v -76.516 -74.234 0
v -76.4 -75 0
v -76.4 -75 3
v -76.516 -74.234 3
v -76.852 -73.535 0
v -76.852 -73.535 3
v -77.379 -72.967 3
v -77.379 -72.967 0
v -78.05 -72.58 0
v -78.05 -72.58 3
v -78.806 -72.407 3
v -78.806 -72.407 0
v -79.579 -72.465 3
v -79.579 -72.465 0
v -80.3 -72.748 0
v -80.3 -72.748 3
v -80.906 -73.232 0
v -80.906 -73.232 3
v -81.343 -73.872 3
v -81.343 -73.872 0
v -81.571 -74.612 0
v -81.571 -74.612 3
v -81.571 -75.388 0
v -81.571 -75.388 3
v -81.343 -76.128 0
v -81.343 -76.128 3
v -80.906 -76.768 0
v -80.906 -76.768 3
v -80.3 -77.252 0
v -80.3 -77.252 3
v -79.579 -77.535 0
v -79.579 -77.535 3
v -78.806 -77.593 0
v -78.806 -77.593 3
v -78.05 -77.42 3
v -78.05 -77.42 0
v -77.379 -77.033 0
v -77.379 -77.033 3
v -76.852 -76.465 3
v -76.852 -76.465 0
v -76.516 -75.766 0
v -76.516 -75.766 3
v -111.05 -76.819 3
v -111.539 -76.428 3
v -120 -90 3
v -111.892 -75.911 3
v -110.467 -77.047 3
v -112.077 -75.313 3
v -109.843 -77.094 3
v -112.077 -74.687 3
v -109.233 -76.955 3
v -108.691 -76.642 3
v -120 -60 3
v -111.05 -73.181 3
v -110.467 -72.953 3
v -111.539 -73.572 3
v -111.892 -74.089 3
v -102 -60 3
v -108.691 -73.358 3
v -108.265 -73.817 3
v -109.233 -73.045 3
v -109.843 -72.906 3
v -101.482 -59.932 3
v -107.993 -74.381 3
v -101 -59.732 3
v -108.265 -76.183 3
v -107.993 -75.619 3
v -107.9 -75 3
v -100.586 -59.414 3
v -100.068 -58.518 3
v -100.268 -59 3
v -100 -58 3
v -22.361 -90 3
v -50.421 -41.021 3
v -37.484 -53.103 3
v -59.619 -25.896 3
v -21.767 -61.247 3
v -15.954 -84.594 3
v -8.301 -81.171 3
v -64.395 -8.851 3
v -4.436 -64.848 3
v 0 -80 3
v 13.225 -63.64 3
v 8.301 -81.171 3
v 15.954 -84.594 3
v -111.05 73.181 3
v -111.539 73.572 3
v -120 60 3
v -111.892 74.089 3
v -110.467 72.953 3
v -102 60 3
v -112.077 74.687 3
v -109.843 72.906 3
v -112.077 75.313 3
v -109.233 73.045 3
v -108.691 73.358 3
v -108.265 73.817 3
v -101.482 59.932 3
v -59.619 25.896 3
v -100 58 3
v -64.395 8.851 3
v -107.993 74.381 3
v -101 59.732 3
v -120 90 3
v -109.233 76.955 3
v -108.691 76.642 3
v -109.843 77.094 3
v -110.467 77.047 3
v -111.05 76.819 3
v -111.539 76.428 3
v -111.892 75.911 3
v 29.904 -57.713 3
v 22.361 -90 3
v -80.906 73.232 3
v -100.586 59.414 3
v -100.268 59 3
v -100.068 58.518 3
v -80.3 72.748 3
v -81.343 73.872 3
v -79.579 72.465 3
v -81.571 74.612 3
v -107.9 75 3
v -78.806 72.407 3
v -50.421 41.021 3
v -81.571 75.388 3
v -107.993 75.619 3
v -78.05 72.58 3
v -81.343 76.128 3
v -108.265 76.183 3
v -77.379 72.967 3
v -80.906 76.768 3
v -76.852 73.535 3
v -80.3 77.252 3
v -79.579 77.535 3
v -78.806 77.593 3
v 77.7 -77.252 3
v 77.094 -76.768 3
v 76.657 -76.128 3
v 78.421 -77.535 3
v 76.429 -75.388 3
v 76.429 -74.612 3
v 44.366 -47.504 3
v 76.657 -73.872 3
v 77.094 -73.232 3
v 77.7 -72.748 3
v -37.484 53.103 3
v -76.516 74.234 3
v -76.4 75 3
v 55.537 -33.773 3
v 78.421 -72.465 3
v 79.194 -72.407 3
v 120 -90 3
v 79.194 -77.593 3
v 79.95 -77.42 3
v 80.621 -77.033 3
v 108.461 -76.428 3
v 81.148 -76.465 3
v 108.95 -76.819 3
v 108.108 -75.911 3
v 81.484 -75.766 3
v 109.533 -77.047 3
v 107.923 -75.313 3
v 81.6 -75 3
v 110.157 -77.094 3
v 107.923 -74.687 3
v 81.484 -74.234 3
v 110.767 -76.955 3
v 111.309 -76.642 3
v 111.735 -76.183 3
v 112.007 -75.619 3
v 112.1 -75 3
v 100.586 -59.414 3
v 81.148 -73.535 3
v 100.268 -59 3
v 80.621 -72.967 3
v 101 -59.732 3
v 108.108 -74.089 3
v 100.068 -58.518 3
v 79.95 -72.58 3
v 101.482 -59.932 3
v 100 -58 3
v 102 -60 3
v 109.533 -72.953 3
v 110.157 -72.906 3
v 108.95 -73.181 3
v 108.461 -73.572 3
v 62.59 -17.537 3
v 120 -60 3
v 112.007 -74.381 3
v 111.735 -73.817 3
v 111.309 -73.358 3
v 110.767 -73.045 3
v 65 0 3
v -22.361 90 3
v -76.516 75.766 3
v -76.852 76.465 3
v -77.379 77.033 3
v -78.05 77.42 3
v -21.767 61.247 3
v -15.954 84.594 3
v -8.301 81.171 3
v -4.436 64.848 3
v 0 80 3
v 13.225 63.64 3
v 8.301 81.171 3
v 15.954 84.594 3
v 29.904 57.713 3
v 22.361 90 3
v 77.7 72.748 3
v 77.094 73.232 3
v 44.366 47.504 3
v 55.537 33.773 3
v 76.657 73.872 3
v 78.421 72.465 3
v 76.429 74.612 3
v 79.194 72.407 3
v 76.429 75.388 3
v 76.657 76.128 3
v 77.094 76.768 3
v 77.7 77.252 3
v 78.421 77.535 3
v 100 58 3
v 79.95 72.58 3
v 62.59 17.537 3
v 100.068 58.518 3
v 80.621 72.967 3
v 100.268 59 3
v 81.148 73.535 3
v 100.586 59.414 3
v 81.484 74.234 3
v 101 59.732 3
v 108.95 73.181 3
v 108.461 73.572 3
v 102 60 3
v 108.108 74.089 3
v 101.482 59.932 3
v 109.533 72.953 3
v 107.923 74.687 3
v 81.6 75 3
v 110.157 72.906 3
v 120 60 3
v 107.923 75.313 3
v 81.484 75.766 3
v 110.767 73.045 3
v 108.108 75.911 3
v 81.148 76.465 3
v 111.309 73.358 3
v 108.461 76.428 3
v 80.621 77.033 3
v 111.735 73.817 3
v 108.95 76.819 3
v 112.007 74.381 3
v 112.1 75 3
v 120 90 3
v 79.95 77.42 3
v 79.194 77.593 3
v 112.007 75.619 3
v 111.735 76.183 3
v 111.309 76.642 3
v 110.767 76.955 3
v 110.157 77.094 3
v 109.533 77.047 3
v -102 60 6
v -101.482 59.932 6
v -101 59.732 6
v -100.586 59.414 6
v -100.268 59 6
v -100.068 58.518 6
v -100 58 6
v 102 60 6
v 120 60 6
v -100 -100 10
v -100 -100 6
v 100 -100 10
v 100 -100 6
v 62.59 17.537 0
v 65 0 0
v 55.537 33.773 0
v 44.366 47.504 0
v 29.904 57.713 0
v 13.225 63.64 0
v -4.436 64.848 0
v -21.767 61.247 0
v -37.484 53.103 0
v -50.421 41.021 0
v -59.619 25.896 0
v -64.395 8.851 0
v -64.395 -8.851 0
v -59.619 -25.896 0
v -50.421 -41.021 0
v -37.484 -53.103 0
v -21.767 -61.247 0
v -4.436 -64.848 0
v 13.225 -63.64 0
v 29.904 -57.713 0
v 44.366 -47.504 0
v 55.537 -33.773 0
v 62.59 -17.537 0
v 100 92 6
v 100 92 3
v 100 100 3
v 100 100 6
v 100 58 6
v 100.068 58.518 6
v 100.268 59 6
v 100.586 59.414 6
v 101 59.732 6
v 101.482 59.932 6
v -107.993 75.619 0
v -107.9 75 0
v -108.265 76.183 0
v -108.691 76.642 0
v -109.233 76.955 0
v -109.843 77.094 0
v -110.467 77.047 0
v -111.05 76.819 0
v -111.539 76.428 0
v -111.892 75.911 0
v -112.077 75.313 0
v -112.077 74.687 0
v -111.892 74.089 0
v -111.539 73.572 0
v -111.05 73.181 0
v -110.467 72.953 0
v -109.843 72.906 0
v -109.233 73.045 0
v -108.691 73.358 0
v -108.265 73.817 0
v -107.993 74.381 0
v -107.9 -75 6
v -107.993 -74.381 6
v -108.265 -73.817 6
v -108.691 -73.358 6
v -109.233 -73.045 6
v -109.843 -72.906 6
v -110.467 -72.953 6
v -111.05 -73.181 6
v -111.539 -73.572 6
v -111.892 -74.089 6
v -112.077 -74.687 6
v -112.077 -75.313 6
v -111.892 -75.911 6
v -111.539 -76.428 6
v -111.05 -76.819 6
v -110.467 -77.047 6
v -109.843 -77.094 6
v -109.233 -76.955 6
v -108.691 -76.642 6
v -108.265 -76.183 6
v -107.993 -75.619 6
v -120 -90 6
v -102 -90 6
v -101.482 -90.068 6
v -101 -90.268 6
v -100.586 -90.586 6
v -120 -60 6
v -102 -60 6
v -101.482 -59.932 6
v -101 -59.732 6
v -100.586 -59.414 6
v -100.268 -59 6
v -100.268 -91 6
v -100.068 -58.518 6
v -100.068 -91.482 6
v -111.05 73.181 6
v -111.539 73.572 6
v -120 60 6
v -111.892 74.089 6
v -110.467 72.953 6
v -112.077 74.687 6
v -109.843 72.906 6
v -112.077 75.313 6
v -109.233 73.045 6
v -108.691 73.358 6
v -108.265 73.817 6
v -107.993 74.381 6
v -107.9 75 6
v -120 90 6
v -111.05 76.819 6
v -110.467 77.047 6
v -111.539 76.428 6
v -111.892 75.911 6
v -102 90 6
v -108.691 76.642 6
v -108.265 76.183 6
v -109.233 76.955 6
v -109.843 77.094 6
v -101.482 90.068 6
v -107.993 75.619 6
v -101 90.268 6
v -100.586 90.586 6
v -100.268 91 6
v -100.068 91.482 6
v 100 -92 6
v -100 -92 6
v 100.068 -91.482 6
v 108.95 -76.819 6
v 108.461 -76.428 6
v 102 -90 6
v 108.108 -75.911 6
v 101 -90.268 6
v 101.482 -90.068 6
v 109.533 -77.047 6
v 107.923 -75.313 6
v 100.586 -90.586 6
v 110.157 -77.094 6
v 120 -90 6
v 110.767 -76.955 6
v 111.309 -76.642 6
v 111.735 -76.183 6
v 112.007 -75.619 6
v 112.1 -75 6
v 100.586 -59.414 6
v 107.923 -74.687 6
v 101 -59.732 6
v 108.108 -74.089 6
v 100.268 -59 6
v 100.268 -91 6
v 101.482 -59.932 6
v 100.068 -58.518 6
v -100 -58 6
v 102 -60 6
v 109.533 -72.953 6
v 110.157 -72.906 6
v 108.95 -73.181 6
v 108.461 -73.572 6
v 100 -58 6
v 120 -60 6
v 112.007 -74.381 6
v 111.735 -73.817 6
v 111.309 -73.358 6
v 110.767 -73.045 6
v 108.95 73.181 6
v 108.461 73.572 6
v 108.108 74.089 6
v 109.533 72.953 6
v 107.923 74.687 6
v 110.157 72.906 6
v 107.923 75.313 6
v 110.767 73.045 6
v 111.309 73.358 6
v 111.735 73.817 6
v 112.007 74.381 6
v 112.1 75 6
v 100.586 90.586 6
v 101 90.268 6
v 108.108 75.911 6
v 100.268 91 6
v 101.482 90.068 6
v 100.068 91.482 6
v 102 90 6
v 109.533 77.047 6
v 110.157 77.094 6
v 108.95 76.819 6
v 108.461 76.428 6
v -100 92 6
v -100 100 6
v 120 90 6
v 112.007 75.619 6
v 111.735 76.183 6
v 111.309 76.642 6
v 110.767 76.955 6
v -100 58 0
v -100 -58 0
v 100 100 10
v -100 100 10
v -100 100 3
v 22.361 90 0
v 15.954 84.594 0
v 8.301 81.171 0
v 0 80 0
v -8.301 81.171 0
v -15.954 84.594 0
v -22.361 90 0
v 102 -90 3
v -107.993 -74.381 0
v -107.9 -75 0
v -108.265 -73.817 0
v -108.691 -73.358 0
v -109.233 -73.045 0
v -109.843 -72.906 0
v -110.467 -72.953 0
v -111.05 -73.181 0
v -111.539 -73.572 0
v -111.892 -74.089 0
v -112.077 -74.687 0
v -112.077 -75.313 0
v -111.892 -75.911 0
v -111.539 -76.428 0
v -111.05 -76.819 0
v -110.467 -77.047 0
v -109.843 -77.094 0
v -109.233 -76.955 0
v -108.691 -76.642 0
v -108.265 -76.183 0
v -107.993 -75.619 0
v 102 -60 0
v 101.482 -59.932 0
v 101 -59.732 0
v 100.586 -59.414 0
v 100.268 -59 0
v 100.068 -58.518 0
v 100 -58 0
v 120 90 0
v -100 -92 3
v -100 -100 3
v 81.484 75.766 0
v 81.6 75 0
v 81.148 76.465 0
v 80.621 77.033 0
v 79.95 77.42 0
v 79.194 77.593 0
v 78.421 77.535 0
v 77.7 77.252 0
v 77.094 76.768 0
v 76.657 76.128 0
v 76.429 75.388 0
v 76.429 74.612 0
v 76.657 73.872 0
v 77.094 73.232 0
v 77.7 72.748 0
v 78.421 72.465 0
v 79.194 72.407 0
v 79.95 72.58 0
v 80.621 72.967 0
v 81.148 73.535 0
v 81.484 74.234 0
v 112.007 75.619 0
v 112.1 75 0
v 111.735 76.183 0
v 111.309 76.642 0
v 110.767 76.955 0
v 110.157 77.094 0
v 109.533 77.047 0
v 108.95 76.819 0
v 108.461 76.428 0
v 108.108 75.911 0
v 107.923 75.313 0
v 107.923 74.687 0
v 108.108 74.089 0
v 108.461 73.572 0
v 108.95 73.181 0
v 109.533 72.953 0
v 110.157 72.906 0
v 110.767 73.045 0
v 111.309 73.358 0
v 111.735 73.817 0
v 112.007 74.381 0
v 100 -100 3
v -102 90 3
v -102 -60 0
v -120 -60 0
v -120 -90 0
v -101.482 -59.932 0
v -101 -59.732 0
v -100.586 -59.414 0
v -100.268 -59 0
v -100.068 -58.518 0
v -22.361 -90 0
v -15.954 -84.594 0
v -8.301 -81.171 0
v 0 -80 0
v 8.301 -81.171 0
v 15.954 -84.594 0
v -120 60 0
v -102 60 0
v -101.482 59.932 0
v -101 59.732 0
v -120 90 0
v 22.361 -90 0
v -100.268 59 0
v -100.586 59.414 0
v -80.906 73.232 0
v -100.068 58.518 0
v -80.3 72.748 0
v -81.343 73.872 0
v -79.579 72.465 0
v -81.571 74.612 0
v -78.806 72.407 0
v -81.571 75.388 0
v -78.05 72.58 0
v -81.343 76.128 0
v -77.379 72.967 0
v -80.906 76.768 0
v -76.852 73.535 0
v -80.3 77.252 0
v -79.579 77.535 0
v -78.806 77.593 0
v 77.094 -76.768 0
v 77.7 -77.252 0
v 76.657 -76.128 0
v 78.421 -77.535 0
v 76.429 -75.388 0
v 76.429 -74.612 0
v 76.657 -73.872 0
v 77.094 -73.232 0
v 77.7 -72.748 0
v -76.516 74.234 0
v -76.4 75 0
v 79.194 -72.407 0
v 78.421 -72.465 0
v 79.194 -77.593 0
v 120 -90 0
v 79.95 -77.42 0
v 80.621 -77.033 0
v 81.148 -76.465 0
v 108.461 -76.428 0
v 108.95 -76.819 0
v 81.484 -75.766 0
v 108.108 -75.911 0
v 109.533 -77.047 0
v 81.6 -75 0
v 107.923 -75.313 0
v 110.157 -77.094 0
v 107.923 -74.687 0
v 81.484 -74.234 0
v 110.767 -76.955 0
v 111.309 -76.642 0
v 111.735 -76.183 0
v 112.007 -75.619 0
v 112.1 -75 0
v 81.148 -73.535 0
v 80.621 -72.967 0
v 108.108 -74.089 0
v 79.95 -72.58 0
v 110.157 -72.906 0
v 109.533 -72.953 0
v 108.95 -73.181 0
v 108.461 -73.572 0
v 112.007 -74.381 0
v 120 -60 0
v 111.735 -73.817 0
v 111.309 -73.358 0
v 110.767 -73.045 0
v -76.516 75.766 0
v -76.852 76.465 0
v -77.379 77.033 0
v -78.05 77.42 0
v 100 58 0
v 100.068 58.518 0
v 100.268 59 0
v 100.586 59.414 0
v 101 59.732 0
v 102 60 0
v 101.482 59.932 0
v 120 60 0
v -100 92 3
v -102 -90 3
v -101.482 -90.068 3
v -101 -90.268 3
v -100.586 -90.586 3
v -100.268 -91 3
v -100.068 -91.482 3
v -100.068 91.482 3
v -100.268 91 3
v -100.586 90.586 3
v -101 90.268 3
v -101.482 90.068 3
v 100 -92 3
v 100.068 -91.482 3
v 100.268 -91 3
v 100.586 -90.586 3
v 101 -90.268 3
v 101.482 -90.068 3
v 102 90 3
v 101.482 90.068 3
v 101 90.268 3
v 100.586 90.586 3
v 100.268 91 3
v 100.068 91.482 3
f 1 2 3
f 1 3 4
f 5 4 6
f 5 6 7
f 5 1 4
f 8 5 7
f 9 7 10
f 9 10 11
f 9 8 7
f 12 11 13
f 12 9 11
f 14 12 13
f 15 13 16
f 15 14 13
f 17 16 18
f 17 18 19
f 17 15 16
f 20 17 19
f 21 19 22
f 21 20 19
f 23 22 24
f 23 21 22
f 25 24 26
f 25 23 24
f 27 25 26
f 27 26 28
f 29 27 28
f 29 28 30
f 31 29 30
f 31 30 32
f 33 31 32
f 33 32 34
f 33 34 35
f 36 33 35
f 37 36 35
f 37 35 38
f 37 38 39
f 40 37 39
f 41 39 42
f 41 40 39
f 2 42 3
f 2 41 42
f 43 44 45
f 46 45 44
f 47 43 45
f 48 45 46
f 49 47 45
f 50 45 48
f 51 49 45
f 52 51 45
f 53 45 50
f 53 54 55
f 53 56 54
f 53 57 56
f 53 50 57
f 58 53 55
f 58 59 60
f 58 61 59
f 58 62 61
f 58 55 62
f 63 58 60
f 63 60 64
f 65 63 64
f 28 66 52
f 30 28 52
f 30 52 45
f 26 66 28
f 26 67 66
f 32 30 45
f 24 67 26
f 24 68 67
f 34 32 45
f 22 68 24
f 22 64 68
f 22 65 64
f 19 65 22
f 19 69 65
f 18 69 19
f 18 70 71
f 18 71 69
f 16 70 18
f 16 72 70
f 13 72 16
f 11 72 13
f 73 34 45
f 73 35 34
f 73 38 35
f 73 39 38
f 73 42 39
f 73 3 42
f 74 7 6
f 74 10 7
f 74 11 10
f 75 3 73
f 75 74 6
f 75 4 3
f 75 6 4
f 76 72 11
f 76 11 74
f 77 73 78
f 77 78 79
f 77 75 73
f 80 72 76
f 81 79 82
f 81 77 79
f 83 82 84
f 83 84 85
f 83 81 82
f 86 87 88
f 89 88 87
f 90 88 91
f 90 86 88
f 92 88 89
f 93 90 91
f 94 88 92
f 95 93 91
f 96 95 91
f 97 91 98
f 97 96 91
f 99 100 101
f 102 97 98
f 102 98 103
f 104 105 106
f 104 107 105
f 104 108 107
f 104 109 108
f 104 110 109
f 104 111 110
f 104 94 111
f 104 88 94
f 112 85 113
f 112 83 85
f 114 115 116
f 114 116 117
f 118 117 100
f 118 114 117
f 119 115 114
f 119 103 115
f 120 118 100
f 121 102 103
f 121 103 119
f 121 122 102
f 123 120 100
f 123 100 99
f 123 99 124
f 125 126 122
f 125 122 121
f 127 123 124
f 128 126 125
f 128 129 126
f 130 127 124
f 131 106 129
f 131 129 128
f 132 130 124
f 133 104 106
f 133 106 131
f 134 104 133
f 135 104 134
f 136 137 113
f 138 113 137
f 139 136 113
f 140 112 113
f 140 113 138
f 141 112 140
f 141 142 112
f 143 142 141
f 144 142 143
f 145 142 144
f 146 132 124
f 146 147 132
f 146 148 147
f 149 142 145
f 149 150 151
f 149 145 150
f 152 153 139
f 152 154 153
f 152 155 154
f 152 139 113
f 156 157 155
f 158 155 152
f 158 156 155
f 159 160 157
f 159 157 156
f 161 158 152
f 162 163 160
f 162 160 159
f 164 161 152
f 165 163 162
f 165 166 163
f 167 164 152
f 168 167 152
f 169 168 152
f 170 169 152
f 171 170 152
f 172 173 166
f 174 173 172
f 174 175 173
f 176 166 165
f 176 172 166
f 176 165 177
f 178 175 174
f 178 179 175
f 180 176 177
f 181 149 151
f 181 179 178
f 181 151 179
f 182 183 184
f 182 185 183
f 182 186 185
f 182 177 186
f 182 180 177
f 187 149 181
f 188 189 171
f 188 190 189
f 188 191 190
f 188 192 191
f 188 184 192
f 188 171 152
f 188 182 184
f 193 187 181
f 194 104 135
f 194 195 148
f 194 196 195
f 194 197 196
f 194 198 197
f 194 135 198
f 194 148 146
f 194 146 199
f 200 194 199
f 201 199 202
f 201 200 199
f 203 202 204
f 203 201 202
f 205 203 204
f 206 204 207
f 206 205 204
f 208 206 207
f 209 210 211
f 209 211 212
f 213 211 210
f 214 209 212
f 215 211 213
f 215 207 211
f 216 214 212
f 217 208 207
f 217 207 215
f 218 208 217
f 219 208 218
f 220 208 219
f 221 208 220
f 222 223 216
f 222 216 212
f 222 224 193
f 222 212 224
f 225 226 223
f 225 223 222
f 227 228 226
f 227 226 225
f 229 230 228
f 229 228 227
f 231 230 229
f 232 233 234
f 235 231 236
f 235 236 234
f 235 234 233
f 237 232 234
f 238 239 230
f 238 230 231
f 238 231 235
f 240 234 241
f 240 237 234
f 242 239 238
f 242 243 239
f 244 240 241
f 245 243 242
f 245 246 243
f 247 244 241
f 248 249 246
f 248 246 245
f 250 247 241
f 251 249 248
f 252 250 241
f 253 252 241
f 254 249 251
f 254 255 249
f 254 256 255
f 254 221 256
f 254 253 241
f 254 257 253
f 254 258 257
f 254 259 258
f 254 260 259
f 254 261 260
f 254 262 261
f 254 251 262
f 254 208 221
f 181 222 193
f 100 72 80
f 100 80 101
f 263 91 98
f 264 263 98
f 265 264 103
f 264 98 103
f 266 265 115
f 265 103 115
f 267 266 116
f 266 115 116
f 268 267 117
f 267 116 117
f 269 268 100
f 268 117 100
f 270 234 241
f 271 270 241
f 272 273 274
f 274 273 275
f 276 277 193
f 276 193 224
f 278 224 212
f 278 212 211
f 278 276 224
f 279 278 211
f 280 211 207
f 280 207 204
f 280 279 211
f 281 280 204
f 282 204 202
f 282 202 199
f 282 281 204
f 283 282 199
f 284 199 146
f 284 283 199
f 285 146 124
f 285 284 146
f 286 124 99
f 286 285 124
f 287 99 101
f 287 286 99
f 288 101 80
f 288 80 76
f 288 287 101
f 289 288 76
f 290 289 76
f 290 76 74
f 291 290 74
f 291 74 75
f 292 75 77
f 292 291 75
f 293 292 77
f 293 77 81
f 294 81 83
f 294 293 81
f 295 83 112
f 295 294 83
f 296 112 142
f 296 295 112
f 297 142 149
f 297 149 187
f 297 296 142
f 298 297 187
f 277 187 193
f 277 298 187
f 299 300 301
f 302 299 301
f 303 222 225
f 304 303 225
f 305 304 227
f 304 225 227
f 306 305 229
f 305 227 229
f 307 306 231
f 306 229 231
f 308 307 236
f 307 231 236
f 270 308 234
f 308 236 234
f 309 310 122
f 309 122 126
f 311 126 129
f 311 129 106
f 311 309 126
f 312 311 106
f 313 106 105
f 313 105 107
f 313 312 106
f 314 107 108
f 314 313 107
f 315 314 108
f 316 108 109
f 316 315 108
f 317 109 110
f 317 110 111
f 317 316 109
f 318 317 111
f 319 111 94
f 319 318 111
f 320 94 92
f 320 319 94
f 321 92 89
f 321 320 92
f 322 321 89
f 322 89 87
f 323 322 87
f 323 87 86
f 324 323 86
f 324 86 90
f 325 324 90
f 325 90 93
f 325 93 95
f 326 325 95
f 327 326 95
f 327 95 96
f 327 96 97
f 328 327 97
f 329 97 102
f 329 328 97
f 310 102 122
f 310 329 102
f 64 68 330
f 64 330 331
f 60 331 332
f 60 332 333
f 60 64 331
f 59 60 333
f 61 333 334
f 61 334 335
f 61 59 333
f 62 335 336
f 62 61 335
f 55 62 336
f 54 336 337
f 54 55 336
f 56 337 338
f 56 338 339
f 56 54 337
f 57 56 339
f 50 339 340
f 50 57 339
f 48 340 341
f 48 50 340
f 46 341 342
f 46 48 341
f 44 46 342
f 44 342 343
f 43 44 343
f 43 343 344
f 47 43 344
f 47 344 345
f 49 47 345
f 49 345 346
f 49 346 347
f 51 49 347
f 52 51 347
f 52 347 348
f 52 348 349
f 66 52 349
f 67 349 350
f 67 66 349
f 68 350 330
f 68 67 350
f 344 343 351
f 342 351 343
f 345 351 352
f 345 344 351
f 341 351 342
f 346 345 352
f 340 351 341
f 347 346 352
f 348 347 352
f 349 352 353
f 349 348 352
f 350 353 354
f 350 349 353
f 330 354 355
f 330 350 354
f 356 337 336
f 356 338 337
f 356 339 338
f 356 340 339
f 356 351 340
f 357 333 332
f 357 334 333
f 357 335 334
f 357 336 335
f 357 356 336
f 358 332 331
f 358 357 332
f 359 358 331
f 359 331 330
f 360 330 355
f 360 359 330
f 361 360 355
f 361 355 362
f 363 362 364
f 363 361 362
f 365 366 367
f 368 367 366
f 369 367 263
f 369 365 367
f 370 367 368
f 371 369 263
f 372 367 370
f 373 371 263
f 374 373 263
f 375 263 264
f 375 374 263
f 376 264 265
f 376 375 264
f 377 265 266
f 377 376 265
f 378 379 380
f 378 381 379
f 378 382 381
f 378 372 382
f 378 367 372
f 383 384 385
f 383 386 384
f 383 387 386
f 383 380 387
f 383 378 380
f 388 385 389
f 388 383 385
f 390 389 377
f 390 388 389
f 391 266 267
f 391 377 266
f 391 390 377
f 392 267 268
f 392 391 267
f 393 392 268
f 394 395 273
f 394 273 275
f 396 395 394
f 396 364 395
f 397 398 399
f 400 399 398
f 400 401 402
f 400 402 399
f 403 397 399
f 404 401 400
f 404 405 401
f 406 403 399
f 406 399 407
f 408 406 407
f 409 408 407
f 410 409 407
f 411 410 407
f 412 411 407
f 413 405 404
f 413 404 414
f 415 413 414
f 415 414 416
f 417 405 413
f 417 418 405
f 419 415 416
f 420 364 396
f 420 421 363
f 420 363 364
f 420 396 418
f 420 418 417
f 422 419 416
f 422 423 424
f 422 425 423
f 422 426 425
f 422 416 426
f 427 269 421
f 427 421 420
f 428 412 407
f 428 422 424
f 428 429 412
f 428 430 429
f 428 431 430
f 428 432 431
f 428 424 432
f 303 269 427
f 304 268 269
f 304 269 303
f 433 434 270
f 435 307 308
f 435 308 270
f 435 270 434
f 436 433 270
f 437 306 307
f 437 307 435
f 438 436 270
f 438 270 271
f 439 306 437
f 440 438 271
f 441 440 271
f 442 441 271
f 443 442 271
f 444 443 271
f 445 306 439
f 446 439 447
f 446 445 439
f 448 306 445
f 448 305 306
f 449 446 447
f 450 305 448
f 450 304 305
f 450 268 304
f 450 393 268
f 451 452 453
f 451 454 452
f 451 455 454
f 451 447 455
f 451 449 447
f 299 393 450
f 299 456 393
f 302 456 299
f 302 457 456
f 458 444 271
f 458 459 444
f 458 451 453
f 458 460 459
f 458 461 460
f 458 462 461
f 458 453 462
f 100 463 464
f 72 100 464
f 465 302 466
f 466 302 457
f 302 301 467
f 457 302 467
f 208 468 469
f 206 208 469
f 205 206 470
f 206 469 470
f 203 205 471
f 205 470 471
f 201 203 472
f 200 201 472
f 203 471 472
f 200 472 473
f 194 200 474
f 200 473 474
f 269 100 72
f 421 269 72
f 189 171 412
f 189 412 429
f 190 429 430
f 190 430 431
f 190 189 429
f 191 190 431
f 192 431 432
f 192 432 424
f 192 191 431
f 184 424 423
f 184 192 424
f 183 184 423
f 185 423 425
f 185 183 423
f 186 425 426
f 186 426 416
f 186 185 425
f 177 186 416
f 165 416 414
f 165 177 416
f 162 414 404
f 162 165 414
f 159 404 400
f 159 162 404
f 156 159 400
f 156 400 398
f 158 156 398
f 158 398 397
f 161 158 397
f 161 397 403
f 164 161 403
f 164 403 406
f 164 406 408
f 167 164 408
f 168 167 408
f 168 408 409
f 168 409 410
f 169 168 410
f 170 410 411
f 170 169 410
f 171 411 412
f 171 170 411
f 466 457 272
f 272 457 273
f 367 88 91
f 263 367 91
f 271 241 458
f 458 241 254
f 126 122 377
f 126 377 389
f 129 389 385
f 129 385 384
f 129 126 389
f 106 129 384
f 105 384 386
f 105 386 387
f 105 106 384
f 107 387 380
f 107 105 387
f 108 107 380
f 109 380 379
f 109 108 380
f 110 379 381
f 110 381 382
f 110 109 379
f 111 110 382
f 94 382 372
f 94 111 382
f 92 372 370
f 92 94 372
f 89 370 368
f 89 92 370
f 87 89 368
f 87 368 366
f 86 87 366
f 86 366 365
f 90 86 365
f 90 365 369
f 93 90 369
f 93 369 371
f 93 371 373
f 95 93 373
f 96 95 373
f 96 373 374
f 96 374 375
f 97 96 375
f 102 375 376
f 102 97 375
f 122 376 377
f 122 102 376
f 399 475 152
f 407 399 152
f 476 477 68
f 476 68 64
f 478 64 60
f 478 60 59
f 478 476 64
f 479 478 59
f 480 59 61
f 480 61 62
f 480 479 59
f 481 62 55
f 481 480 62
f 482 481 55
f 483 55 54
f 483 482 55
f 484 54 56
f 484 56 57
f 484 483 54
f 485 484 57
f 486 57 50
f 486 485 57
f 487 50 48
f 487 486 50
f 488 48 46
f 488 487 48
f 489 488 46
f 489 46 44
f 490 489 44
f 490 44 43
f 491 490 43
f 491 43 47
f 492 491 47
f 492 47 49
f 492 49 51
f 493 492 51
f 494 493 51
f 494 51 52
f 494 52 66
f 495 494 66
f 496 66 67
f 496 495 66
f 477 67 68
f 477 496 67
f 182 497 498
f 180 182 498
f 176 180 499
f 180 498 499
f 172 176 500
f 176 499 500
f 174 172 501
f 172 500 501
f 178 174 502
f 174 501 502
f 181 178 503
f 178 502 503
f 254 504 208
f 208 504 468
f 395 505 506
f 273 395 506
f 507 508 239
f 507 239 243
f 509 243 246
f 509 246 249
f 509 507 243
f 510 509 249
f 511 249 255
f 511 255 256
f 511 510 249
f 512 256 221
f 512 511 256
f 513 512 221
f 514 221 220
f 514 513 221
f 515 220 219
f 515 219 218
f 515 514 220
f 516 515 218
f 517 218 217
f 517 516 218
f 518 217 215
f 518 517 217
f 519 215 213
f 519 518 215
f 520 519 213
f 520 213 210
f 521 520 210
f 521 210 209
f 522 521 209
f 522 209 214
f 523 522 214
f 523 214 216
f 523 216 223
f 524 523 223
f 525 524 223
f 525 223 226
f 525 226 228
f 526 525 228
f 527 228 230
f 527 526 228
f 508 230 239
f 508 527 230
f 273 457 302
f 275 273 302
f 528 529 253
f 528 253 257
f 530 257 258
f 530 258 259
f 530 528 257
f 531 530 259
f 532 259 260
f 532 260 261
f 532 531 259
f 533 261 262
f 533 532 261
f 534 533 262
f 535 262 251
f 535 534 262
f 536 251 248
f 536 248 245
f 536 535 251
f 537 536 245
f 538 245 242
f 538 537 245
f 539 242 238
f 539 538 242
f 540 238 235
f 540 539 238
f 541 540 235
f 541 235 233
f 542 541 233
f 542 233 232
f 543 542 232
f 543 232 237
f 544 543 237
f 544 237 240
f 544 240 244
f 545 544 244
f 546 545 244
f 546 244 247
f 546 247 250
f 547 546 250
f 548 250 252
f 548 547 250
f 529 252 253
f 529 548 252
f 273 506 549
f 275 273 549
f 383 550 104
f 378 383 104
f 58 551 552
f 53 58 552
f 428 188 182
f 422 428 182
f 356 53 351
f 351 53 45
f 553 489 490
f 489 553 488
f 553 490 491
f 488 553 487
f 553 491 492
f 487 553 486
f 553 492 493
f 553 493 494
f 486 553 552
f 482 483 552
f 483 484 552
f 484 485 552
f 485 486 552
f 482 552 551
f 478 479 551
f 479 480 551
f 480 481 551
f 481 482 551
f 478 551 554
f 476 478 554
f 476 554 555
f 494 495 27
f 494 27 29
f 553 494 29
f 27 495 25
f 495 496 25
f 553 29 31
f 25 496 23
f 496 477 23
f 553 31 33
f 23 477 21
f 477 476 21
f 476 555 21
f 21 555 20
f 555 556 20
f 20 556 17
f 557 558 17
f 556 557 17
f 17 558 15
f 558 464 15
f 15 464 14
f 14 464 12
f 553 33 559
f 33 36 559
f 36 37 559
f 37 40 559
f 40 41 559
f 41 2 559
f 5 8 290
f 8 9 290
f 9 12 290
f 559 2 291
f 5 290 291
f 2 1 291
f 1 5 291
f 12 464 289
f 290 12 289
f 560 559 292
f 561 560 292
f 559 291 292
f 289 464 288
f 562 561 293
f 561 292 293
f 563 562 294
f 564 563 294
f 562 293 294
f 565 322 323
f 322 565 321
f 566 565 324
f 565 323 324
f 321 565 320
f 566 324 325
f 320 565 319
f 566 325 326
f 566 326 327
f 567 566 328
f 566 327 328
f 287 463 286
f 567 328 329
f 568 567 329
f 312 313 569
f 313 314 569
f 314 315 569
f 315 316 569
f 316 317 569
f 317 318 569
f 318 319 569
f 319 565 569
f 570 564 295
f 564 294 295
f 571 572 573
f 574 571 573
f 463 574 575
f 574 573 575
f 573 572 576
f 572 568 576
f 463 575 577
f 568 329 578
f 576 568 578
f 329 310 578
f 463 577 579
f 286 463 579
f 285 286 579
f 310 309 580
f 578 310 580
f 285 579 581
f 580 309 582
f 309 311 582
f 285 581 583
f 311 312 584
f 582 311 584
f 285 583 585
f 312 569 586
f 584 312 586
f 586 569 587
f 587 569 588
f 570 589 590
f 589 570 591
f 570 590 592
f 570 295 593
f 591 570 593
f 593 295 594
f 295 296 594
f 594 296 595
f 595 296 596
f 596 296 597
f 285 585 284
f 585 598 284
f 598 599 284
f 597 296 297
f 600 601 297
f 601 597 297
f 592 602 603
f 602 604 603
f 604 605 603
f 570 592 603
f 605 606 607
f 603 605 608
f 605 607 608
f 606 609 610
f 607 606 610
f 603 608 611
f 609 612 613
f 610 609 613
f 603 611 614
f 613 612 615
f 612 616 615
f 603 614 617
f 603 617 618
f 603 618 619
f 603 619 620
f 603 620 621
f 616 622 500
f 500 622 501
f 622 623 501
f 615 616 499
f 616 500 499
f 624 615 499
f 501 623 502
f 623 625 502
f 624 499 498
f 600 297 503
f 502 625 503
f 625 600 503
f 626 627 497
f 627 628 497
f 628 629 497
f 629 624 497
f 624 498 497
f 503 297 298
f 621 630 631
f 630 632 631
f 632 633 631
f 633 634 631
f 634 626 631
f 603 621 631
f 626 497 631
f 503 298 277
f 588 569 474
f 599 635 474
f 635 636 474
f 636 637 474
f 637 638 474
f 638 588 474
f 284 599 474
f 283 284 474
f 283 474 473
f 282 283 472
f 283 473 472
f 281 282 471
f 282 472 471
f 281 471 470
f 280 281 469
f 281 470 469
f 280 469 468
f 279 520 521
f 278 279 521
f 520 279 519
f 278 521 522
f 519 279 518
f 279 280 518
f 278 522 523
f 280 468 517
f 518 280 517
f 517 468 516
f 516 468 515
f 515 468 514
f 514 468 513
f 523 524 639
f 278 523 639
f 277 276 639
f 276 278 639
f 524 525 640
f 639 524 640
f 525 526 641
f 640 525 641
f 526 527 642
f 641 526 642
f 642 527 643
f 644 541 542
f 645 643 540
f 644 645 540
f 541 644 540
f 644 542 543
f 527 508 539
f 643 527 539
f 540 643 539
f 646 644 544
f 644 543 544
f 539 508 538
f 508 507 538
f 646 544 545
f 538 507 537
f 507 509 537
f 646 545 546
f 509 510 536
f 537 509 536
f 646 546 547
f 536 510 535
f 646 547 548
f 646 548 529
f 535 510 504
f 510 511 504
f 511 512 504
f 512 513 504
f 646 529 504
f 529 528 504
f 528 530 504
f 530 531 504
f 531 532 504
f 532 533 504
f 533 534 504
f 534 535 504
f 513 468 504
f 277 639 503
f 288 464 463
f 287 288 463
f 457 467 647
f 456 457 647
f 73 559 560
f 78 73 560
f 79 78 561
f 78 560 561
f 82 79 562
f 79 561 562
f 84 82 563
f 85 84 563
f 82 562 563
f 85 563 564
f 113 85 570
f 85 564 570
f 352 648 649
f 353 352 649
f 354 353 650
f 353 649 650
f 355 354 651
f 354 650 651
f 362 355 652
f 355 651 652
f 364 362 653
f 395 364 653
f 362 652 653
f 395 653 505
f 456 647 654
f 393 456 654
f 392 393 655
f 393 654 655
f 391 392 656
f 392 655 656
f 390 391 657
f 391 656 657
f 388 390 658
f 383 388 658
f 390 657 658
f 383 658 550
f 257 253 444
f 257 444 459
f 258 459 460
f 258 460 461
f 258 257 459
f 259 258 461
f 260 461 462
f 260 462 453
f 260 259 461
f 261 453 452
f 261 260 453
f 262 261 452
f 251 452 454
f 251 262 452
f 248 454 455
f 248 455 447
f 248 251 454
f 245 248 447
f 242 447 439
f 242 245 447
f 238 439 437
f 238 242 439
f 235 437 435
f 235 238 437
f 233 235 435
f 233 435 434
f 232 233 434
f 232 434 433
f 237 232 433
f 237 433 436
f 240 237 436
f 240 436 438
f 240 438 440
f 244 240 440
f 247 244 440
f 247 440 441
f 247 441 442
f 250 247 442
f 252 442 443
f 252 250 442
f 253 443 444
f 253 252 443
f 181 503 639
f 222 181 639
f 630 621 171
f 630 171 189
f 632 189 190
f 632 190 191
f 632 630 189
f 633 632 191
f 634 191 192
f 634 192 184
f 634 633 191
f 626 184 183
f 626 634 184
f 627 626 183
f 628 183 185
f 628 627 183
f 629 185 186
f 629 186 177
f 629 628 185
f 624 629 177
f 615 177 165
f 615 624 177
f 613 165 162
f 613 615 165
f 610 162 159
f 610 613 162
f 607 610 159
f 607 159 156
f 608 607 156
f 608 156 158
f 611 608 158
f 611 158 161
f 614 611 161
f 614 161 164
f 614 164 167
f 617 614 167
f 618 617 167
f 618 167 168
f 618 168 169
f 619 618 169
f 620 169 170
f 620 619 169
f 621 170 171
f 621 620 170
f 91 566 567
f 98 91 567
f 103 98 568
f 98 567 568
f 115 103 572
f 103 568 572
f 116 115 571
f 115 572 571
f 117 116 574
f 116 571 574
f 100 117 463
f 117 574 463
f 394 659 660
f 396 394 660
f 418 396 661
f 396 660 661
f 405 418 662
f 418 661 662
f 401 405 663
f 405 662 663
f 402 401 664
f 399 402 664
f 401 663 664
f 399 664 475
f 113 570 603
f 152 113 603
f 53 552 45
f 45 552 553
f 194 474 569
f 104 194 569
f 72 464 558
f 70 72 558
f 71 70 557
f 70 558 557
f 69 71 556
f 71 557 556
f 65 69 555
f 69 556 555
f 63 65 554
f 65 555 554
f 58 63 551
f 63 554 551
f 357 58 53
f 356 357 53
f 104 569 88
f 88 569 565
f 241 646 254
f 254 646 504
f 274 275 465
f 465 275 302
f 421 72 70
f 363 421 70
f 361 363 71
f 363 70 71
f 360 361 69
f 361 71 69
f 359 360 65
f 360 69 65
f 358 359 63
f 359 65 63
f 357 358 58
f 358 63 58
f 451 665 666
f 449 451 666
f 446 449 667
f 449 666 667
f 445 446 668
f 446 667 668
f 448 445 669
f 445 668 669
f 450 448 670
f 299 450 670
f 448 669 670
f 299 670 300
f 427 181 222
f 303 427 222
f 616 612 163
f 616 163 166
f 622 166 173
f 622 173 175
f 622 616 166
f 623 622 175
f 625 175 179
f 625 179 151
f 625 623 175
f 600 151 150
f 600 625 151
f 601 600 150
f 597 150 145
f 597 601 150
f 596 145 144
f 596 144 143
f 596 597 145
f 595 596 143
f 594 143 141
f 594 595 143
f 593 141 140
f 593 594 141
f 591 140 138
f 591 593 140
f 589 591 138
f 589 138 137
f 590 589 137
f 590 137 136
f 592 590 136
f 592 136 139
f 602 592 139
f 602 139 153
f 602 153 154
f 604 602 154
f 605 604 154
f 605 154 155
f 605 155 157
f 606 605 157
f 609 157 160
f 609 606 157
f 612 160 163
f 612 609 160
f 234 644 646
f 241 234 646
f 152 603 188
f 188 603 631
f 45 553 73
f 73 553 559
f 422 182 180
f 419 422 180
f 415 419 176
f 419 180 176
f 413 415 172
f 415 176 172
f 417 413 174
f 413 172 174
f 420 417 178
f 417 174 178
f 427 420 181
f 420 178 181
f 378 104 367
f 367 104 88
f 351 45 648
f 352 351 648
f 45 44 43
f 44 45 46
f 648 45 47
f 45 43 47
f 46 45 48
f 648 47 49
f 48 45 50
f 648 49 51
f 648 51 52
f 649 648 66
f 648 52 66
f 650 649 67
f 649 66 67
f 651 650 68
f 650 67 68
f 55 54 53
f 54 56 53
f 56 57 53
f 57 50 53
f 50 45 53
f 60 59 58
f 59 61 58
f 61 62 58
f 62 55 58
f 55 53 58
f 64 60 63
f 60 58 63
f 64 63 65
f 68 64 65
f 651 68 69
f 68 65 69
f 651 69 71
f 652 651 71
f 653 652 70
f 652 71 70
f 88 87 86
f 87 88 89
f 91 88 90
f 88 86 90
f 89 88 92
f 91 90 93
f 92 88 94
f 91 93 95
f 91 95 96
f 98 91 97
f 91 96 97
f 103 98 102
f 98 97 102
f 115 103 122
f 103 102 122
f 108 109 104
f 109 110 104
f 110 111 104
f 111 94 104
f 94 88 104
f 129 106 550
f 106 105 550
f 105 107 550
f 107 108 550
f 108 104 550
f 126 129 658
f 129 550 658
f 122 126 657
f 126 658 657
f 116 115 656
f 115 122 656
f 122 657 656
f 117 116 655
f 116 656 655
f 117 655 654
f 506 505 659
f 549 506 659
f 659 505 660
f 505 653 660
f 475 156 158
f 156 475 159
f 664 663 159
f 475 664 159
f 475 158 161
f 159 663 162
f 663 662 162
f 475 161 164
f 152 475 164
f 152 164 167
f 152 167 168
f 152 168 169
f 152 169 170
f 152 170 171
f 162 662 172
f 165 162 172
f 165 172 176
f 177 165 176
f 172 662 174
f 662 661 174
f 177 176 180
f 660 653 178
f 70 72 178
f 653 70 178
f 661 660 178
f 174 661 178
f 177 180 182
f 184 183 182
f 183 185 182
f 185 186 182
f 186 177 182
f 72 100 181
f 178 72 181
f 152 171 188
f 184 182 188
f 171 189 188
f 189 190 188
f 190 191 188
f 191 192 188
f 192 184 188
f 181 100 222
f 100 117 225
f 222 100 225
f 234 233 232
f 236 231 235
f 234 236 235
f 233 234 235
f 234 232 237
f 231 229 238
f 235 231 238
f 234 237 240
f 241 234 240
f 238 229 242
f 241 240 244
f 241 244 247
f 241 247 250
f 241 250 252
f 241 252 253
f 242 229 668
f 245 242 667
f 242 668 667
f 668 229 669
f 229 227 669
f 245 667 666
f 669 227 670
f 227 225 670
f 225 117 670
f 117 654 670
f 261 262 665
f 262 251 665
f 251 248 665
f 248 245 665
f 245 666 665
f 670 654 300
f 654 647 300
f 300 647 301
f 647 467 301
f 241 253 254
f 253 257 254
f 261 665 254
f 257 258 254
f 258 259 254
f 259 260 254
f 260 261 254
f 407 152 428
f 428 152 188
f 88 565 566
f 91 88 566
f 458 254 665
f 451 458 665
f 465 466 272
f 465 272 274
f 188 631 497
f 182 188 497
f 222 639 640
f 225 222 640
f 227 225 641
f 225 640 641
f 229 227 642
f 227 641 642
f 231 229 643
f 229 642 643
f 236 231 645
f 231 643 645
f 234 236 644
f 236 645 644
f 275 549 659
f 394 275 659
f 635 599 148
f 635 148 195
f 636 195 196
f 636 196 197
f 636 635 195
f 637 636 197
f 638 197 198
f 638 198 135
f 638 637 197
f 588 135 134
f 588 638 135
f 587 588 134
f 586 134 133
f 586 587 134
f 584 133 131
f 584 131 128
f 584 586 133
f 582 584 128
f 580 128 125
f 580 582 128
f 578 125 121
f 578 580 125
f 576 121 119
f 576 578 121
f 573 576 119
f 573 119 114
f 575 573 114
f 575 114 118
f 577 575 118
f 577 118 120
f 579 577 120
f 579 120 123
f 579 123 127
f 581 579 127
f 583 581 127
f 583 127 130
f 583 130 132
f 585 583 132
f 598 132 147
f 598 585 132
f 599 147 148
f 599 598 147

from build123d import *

# Parameters (mm, degrees)
F0_R     = 2.1
F0_R_2   = 2.6
F0_R_3   = 65
F1_DEPTH = 3
F2_R     = 2.1
F2_R_2   = 2.6
F2_R_3   = 65
F3_DEPTH = 3
F5_DEPTH = 4


with BuildPart() as f1:
    # F0 (on Top) → F1 (new body)
    with BuildSketch(Plane.XY):
        with BuildLine():
            Line((-120, -60), (-120, -90))
            Line((-120, -90), (-102, -90))
            Line((-102, -90), (-22.360679775, -90))
            ThreePointArc((-22.360679775, -90), (0, -80), (22.360679775, -90))
            Line((22.360679775, -90), (102, -90))
            Line((102, -90), (120, -90))
            Line((120, -90), (120, -60))
            Line((120, -60), (102, -60))
            ThreePointArc((102, -60), (100.5857864376, -59.4142135624), (100, -58))
            Line((100, -58), (100, 58))
            ThreePointArc((100, 58), (100.5857864376, 59.4142135624), (102, 60))
            Line((102, 60), (120, 60))
            Line((120, 60), (120, 90))
            Line((120, 90), (102, 90))
            Line((102, 90), (22.360679775, 90))
            ThreePointArc((22.360679775, 90), (0, 80), (-22.360679775, 90))
            Line((-22.360679775, 90), (-102, 90))
            Line((-102, 90), (-120, 90))
            Line((-120, 90), (-120, 60))
            Line((-120, 60), (-102, 60))
            ThreePointArc((-102, 60), (-100.5857864376, 59.4142135624), (-100, 58))
            Line((-100, 58), (-100, -58))
            ThreePointArc((-100, -58), (-100.5857864376, -59.4142135624), (-102, -60))
            Line((-102, -60), (-120, -60))
        make_face()
        with Locations((-110, -75)):
            Circle(F0_R, mode=Mode.SUBTRACT)
        with Locations((-79, -75)):
            Circle(F0_R_2, mode=Mode.SUBTRACT)
        with Locations((79, -75)):
            Circle(F0_R_2, mode=Mode.SUBTRACT)
        with Locations((110, -75)):
            Circle(F0_R, mode=Mode.SUBTRACT)
        with Locations((-110, 75)):
            Circle(F0_R, mode=Mode.SUBTRACT)
        with Locations((-79, 75)):
            Circle(F0_R_2, mode=Mode.SUBTRACT)
        Circle(F0_R_3, mode=Mode.SUBTRACT)
        with Locations((79, 75)):
            Circle(F0_R_2, mode=Mode.SUBTRACT)
        with Locations((110, 75)):
            Circle(F0_R, mode=Mode.SUBTRACT)
    extrude(amount=F1_DEPTH)


with BuildPart() as f3:
    # F2 (on face) → F3 (new body)
    with BuildSketch(Plane.XY.offset(3)):
        with BuildLine():
            Line((-22.360679775, 90), (-102, 90))
            Line((-102, 90), (-120, 90))
            Line((-120, 90), (-120, 60))
            Line((-120, 60), (-102, 60))
            ThreePointArc((-102, 60), (-100.5857864376, 59.4142135624), (-100, 58))
            Line((-100, 58), (-100, -58))
            ThreePointArc((-100, -58), (-100.5857864376, -59.4142135624), (-102, -60))
            Line((-102, -60), (-120, -60))
            Line((-120, -60), (-120, -90))
            Line((-120, -90), (-102, -90))
            Line((-102, -90), (-22.360679775, -90))
            ThreePointArc((-22.360679775, -90), (0, -80), (22.360679775, -90))
            Line((22.360679775, -90), (102, -90))
            Line((102, -90), (120, -90))
            Line((120, -90), (120, -60))
            Line((120, -60), (102, -60))
            ThreePointArc((102, -60), (100.5857864376, -59.4142135624), (100, -58))
            Line((100, -58), (100, 58))
            ThreePointArc((100, 58), (100.5857864376, 59.4142135624), (102, 60))
            Line((102, 60), (120, 60))
            Line((120, 60), (120, 90))
            Line((120, 90), (102, 90))
            Line((102, 90), (22.360679775, 90))
            ThreePointArc((22.360679775, 90), (0, 80), (-22.360679775, 90))
        make_face()
        with Locations((-110, -75)):
            Circle(F2_R, mode=Mode.SUBTRACT)
        with Locations((-79, -75)):
            Circle(F2_R_2, mode=Mode.SUBTRACT)
        with Locations((79, -75)):
            Circle(F2_R_2, mode=Mode.SUBTRACT)
        with Locations((110, -75)):
            Circle(F2_R, mode=Mode.SUBTRACT)
        with Locations((-110, 75)):
            Circle(F2_R, mode=Mode.SUBTRACT)
        with Locations((-79, 75)):
            Circle(F2_R_2, mode=Mode.SUBTRACT)
        Circle(F2_R_3, mode=Mode.SUBTRACT)
        with Locations((79, 75)):
            Circle(F2_R_2, mode=Mode.SUBTRACT)
        with Locations((110, 75)):
            Circle(F2_R, mode=Mode.SUBTRACT)
        with BuildLine():
            Line((100, 100), (-100, 100))
            Line((-100, 100), (-100, 92))
            ThreePointArc((-100, 92), (-100.5857864376, 90.5857864376), (-102, 90))
            Line((-102, 90), (-22.360679775, 90))
            ThreePointArc((-22.360679775, 90), (0, 80), (22.360679775, 90))
            Line((22.360679775, 90), (102, 90))
            ThreePointArc((102, 90), (100.5857864376, 90.5857864376), (100, 92))
            Line((100, 92), (100, 100))
        make_face()
        with Locations((-79, 75)):
            Circle(F2_R_2)
        Circle(F2_R_3)
        with Locations((79, 75)):
            Circle(F2_R_2)
        with Locations((79, -75)):
            Circle(F2_R_2)
        with BuildLine():
            Line((-22.360679775, -90), (-102, -90))
            ThreePointArc((-102, -90), (-100.5857864376, -90.5857864376), (-100, -92))
            Line((-100, -92), (-100, -100))
            Line((-100, -100), (100, -100))
            Line((100, -100), (100, -92))
            ThreePointArc((100, -92), (100.5857864376, -90.5857864376), (102, -90))
            Line((102, -90), (22.360679775, -90))
            ThreePointArc((22.360679775, -90), (0, -80), (-22.360679775, -90))
        make_face()
        with Locations((-79, -75)):
            Circle(F2_R_2)
    extrude(amount=F3_DEPTH)


with BuildPart() as f5:
    # F4 (on face) → F5 (new body)
    with BuildSketch(Plane.XY.offset(6)):
        Polygon((100, 100), (-100, 100), (-100, 92), (-100, 58), (-100, -58), (-100, -92), (-100, -100), (100, -100), (100, -92), (100, -58), (100, 58), (100, 92), align=None)
    extrude(amount=F5_DEPTH)


solid = Compound([f1.part, f3.part, f5.part])
